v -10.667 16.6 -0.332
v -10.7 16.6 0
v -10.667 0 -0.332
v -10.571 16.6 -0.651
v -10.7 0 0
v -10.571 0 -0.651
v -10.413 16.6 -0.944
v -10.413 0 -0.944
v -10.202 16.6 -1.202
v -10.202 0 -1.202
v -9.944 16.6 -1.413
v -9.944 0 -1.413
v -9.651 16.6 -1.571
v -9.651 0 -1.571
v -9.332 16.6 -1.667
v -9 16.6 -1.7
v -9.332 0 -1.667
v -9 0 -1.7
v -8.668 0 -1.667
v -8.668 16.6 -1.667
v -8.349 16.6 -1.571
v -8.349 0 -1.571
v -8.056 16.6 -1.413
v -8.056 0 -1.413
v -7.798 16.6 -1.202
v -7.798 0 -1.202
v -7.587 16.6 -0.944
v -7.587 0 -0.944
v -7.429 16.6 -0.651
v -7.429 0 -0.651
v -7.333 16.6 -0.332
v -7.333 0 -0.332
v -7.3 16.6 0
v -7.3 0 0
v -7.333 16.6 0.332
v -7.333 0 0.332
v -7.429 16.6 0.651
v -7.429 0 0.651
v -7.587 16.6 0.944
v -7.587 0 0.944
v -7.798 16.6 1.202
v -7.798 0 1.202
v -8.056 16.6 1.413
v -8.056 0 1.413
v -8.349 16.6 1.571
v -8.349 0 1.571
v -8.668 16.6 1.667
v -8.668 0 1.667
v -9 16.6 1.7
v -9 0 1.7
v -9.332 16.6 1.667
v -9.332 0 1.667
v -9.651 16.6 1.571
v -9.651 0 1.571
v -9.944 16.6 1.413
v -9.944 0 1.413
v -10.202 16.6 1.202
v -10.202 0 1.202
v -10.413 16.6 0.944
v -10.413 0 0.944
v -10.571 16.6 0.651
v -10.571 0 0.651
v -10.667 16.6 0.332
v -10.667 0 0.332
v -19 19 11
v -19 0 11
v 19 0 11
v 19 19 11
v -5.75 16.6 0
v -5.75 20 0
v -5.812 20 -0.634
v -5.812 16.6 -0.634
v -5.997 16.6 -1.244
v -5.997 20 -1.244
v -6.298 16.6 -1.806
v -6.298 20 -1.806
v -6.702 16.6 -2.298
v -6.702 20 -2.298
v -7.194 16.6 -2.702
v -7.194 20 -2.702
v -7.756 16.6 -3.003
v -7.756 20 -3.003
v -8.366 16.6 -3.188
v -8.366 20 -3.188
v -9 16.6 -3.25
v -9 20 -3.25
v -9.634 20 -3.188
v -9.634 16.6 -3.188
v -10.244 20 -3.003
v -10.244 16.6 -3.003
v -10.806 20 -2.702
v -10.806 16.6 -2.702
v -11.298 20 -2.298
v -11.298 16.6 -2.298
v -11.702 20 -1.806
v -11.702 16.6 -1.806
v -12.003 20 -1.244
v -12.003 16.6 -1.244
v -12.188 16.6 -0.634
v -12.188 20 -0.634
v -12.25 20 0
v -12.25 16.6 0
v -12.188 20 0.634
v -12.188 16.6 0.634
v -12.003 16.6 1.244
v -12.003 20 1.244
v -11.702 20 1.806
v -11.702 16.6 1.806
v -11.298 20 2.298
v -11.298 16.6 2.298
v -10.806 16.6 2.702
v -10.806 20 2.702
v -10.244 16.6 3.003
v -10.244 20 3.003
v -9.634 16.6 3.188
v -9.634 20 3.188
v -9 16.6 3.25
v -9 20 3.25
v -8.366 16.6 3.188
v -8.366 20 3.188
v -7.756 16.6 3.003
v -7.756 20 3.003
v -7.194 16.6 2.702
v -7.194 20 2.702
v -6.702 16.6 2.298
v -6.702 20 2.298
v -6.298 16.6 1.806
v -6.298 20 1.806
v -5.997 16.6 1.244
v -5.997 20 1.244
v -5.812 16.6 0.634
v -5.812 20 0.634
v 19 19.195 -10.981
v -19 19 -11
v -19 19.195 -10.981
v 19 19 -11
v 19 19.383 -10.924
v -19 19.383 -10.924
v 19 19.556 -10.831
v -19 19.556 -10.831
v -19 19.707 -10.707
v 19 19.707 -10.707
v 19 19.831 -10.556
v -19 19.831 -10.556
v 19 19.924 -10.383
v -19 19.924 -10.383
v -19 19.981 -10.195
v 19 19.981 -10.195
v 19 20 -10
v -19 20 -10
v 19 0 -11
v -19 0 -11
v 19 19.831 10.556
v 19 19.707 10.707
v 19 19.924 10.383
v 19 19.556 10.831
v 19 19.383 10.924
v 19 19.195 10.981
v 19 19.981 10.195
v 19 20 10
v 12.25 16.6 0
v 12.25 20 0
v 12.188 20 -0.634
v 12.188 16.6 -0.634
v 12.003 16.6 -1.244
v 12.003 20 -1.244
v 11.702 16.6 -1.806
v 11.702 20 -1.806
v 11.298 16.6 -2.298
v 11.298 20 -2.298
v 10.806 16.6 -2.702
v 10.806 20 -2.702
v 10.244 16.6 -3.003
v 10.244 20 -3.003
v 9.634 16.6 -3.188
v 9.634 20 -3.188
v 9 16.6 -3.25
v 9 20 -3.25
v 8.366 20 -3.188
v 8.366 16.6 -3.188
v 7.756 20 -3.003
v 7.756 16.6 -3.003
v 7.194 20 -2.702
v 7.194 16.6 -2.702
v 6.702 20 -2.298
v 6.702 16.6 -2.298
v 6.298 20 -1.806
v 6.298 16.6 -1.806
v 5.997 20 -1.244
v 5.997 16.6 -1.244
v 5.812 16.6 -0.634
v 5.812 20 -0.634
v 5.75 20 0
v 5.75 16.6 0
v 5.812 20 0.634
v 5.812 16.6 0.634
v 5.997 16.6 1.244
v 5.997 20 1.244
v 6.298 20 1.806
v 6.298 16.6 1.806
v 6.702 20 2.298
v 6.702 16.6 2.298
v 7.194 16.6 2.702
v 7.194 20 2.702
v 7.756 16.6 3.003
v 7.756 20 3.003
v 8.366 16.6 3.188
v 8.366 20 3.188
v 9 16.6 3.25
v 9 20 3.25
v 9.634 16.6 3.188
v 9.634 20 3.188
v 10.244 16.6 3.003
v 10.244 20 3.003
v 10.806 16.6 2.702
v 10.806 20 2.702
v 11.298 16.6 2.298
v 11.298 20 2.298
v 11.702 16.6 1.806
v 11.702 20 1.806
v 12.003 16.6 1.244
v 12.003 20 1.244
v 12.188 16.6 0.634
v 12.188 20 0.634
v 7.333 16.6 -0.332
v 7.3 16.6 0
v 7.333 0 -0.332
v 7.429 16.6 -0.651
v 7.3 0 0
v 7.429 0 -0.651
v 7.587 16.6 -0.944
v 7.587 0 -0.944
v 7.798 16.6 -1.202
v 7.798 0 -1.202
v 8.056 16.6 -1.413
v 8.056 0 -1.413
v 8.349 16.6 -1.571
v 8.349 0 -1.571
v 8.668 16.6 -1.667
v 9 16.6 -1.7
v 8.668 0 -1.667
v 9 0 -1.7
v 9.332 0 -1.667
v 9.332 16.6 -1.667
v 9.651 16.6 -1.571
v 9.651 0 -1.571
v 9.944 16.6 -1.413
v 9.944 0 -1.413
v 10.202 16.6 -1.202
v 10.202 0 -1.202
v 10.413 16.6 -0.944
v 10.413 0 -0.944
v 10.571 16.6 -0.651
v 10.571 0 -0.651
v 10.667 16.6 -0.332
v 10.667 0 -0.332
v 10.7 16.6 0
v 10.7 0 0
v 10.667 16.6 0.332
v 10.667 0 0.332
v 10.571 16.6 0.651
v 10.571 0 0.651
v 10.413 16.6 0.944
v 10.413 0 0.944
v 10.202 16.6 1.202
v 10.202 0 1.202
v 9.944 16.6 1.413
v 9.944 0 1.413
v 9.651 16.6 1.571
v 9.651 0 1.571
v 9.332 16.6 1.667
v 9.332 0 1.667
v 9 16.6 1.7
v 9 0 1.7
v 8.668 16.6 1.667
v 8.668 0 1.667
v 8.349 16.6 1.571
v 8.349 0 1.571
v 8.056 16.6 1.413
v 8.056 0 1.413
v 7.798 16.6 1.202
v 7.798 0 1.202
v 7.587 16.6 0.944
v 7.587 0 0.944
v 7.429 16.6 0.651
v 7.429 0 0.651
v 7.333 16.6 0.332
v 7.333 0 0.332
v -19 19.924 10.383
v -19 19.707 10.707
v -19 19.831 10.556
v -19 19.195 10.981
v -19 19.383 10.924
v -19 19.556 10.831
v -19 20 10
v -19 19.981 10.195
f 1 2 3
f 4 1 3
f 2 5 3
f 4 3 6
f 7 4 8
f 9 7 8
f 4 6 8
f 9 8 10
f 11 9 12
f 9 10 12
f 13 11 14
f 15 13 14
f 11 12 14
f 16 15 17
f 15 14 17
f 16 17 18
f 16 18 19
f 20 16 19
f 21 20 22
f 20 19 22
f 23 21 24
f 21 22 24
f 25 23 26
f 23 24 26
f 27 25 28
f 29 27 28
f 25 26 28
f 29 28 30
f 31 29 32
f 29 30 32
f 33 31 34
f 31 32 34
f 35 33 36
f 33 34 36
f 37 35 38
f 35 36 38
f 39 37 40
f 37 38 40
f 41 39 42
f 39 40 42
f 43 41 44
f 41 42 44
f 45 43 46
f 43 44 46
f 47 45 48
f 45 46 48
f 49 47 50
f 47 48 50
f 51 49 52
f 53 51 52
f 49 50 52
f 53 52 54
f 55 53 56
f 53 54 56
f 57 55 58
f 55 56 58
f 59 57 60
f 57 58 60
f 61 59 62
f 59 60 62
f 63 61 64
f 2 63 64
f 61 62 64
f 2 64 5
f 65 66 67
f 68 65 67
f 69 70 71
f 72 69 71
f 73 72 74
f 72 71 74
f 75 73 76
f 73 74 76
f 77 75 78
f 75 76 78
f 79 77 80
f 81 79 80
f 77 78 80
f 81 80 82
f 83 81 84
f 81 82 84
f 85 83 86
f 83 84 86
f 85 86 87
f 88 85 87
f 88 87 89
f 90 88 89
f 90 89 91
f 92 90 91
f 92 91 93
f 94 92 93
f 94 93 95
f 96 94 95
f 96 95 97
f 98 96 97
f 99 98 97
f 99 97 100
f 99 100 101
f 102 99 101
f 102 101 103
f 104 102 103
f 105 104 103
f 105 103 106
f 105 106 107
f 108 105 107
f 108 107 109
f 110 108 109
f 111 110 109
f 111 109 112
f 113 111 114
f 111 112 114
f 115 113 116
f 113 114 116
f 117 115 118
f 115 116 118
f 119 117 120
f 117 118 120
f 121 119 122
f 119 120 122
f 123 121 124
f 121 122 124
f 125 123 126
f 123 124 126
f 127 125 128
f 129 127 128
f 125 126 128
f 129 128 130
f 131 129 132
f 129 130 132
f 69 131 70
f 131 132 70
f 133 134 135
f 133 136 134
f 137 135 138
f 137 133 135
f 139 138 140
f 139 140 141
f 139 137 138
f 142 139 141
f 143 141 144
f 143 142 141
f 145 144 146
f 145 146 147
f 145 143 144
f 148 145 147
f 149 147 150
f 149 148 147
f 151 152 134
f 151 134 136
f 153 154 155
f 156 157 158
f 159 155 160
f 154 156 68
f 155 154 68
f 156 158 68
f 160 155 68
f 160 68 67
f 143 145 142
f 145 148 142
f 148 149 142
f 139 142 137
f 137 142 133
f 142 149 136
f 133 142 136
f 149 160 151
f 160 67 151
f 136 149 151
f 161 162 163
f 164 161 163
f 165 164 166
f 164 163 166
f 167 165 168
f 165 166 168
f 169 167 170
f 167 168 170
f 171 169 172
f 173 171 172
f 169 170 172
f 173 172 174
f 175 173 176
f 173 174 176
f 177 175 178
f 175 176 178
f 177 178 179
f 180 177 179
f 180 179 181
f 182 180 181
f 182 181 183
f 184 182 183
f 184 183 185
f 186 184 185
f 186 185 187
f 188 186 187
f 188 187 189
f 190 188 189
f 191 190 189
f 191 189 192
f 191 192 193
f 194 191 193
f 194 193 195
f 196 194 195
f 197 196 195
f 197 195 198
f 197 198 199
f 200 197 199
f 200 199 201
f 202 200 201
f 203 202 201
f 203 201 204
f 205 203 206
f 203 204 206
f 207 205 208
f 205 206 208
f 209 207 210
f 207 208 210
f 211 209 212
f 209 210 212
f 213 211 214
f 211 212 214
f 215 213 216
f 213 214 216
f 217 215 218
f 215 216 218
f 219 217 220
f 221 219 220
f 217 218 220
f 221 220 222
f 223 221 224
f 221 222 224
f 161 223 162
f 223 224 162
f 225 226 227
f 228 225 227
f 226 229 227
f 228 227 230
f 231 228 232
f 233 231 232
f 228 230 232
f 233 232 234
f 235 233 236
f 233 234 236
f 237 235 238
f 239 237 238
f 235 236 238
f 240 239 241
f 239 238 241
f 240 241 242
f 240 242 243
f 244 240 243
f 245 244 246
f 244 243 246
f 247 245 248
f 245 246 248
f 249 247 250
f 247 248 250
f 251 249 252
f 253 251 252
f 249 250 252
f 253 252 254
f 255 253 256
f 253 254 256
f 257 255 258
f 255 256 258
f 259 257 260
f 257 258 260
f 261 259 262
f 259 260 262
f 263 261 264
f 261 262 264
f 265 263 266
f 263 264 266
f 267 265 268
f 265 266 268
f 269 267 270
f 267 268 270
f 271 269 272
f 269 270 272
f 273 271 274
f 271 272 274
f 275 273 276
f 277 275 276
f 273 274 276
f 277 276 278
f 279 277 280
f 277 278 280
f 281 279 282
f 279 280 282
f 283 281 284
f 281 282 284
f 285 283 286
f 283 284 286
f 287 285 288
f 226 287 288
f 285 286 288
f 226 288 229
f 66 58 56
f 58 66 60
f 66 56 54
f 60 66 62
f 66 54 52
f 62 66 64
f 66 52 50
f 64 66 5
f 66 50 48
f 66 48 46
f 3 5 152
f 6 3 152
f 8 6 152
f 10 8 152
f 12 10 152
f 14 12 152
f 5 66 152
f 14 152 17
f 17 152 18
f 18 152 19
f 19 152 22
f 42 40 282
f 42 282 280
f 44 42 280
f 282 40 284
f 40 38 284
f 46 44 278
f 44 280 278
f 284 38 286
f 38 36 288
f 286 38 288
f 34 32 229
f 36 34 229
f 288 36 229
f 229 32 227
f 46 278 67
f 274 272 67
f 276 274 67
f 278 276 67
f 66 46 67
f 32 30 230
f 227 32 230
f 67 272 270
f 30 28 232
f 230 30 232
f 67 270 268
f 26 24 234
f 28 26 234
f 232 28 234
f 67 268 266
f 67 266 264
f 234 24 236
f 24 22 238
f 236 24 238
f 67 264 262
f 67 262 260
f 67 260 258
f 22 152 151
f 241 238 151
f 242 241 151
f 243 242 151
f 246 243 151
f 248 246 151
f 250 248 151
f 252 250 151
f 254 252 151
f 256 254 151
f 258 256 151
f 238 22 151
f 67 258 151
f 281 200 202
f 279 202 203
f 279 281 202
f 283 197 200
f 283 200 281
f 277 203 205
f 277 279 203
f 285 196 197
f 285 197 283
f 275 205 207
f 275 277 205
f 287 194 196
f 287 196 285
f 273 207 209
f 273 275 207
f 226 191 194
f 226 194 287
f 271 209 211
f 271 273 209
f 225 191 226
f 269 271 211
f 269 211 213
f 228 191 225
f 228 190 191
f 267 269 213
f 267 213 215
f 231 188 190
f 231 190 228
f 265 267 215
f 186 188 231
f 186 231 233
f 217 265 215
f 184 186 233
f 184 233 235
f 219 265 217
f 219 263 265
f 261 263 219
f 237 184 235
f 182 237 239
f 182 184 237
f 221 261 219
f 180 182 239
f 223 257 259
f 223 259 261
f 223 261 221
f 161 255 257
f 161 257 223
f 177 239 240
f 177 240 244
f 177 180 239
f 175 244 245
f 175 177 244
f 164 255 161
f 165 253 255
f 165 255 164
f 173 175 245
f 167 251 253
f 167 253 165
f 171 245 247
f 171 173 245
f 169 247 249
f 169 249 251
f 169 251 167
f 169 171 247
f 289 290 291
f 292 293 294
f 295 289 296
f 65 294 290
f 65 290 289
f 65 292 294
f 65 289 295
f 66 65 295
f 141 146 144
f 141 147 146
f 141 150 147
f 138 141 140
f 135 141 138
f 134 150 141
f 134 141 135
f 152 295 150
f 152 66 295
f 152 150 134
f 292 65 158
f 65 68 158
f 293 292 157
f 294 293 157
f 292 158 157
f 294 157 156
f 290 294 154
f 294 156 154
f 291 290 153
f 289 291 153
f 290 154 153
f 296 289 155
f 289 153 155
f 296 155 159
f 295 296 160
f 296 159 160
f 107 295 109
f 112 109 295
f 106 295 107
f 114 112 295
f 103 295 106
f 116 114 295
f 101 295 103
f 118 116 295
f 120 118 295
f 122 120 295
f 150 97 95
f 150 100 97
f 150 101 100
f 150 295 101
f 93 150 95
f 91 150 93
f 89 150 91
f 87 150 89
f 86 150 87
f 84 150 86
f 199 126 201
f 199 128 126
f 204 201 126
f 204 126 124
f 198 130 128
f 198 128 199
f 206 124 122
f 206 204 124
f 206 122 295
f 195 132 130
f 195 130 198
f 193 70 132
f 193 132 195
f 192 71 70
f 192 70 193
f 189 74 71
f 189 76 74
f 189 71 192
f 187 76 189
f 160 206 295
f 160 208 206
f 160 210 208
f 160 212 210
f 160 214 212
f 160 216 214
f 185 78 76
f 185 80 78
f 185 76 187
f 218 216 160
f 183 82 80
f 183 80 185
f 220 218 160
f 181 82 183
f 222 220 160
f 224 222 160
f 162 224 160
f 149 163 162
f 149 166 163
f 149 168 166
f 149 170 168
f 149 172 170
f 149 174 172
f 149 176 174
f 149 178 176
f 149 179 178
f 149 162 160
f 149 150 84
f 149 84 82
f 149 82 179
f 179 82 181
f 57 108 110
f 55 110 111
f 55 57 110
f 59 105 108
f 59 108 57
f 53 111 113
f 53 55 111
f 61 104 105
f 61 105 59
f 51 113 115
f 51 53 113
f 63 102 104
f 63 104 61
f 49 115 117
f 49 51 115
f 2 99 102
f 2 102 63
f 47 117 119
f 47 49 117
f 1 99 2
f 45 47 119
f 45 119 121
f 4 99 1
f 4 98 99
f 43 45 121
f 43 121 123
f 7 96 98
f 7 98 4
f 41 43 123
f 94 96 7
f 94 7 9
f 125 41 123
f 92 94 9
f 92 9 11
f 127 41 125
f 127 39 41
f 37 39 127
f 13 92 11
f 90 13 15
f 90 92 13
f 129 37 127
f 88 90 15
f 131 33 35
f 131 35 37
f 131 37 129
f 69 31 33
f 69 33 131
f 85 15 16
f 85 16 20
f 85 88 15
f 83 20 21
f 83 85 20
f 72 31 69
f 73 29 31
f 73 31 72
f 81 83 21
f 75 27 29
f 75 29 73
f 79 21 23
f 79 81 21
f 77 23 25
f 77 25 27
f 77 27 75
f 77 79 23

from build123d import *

# Parameters (mm, degrees)
ESQUISSE2_W                                        = 38
ESQUISSE2_H                                        = 22
BOSS_EXTRU_1_DEPTH                                 = 20
CHAMBRAGE_POUR_VIS_T_TE_HEXAGONALE_M31_D           = 3.4
CHAMBRAGE_POUR_VIS_T_TE_HEXAGONALE_M31_CBORE_D     = 6.5
CHAMBRAGE_POUR_VIS_T_TE_HEXAGONALE_M31_CBORE_DEPTH = 3.4
CONG_1_R                                           = 1


with BuildPart() as part:
    # Esquisse2 → Boss.-Extru.1 (new body)
    with BuildSketch(Plane(origin=(0, 0, 0), x_dir=(1, 0, 0), z_dir=(0, 1, 0))):
        Rectangle(ESQUISSE2_W, ESQUISSE2_H)
    extrude(amount=BOSS_EXTRU_1_DEPTH)

    # Chambrage pour vis à tête hexagonale M31 (through all)
    with Locations(Plane(origin=(0, 20, 0), x_dir=(1, 0, 0), z_dir=(0, 1, 0))):
        with Locations((-9, 0), (9, 0)):
            CounterBoreHole(CHAMBRAGE_POUR_VIS_T_TE_HEXAGONALE_M31_D / 2, CHAMBRAGE_POUR_VIS_T_TE_HEXAGONALE_M31_CBORE_D / 2, CHAMBRAGE_POUR_VIS_T_TE_HEXAGONALE_M31_CBORE_DEPTH)

    # Congé1
    cong_1_edges = [part.edges().sort_by_distance(p)[0] for p in [
        (0, 20, -11),
        (0, 20, 11),
    ]]
    fillet(cong_1_edges, radius=CONG_1_R)


solid = part.part
